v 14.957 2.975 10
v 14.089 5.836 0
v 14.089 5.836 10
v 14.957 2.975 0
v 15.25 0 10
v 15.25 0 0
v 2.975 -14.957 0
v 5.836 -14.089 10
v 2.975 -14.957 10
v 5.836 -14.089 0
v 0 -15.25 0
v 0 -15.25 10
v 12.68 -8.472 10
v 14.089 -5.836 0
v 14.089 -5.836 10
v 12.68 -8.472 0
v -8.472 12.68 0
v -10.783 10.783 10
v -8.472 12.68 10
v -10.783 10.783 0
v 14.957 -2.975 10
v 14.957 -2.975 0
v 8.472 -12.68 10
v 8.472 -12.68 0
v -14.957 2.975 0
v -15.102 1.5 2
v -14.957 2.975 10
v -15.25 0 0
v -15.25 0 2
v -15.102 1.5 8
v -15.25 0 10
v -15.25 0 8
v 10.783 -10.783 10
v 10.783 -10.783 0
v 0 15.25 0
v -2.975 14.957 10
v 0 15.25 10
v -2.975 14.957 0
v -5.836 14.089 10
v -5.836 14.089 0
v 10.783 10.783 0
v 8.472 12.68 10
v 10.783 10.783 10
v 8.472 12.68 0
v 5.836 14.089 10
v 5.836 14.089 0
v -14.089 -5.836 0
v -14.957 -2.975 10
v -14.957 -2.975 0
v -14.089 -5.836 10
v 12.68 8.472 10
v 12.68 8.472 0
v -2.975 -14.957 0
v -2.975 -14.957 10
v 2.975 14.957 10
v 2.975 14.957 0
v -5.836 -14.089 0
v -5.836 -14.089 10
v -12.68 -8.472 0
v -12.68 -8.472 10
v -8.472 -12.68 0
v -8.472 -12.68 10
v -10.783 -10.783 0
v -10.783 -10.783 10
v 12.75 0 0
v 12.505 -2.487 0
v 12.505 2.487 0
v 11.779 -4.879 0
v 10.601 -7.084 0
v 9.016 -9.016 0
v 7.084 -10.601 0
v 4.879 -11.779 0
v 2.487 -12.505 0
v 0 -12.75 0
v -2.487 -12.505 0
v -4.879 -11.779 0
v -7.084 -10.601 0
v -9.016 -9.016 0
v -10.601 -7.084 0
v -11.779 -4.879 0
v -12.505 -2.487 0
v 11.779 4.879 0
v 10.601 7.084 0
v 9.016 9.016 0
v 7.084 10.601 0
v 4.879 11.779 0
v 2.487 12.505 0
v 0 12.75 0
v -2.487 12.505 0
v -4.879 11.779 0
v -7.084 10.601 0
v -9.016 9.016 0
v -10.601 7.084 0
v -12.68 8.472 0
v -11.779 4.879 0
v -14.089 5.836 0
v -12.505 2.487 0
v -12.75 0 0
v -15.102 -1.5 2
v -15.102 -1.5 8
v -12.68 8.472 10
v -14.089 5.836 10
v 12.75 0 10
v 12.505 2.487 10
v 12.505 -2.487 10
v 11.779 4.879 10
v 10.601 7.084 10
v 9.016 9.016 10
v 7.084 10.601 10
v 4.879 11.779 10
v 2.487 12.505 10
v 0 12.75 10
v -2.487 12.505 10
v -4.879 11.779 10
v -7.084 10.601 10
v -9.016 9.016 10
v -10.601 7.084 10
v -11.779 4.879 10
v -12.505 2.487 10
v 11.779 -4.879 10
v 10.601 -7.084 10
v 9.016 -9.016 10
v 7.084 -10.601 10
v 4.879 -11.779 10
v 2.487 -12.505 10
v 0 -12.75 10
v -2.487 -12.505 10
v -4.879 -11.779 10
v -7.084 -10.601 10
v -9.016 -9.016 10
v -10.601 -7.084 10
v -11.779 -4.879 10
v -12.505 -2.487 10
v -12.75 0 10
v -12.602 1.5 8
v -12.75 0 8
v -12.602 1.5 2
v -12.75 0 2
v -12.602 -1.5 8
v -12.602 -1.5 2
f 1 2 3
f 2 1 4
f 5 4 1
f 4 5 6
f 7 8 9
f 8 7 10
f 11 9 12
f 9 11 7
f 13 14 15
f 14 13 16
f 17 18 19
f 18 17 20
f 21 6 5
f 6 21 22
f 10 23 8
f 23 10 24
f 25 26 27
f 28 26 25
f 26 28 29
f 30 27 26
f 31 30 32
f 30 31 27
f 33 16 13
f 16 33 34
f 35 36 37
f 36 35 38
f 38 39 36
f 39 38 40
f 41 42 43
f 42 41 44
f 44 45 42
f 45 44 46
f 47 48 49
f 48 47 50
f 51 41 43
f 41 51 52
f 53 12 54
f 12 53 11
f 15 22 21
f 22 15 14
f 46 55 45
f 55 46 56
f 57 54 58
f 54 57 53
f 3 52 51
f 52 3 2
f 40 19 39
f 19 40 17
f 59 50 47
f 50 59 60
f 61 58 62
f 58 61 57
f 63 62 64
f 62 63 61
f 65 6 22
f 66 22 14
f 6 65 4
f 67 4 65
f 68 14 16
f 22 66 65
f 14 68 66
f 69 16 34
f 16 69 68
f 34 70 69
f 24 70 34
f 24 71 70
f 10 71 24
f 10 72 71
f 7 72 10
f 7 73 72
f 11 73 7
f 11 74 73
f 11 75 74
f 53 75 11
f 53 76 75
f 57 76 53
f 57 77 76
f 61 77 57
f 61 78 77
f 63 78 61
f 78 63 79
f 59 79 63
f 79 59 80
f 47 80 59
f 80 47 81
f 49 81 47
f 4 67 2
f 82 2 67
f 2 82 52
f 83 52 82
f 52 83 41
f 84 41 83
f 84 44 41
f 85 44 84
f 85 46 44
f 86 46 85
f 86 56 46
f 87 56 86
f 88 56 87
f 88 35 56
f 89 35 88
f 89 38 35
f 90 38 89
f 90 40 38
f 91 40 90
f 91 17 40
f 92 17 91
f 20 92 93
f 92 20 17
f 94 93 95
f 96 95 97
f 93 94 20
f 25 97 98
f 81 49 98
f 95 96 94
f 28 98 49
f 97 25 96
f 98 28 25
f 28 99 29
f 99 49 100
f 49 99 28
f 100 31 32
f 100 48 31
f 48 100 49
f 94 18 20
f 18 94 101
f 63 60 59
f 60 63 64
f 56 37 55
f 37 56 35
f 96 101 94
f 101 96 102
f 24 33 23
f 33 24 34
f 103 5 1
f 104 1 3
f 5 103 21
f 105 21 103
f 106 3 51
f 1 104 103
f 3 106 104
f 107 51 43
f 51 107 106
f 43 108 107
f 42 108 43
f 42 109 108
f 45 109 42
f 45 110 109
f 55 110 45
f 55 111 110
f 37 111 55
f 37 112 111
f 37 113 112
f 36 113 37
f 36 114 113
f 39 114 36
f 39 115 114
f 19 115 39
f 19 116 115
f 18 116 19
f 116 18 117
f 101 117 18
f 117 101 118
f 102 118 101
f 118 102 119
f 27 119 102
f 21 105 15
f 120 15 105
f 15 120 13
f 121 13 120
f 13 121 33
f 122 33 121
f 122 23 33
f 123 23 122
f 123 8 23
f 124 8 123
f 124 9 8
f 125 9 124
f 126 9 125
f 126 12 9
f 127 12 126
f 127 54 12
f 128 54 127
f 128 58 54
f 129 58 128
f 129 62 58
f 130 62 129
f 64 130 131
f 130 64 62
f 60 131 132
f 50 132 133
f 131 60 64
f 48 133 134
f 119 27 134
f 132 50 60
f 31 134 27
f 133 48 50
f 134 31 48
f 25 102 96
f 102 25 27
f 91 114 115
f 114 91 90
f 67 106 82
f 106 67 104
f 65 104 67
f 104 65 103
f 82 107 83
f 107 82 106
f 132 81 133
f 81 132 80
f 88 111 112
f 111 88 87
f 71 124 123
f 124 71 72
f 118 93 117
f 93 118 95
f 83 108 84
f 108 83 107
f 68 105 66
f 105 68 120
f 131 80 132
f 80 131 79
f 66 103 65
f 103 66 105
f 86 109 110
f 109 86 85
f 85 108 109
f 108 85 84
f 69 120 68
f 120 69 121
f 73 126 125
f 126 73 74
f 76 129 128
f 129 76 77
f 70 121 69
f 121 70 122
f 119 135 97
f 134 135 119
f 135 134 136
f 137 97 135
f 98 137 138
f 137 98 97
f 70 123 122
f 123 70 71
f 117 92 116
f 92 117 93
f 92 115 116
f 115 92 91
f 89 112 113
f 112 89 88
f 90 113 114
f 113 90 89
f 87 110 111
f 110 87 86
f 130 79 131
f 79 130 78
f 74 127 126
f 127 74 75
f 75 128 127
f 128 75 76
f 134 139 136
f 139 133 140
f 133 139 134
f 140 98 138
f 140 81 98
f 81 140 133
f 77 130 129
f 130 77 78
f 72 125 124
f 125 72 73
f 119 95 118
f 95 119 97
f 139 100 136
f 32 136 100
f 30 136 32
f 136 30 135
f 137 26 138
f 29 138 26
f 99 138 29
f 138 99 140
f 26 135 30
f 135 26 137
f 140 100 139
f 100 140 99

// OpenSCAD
$fn = 32;

// ----------------------------------------------------------------------
// Spacer sleeve: 30.5 / 25.5 x 10 mm
// ----------------------------------------------------------------------

// --- parameters (mm) ---
outer_d = 30.5;           // outside diameter
inner_d = 25.5;           // shaft bore
length = 10;              // sleeve length
slot_w = 3;               // clamp slot width
slot_len = 6;             // clamp slot length

module sleeve() {
  cylinder(h = length, d = outer_d);
}

difference() {
  sleeve();
  translate([0, 0, -1]) cylinder(h = length + 2, d = inner_d);
  translate([-outer_d / 2 - 1, -slot_w / 2, length / 2 - slot_len / 2]) cube([outer_d / 2 + 1, slot_w, slot_len]);
}
